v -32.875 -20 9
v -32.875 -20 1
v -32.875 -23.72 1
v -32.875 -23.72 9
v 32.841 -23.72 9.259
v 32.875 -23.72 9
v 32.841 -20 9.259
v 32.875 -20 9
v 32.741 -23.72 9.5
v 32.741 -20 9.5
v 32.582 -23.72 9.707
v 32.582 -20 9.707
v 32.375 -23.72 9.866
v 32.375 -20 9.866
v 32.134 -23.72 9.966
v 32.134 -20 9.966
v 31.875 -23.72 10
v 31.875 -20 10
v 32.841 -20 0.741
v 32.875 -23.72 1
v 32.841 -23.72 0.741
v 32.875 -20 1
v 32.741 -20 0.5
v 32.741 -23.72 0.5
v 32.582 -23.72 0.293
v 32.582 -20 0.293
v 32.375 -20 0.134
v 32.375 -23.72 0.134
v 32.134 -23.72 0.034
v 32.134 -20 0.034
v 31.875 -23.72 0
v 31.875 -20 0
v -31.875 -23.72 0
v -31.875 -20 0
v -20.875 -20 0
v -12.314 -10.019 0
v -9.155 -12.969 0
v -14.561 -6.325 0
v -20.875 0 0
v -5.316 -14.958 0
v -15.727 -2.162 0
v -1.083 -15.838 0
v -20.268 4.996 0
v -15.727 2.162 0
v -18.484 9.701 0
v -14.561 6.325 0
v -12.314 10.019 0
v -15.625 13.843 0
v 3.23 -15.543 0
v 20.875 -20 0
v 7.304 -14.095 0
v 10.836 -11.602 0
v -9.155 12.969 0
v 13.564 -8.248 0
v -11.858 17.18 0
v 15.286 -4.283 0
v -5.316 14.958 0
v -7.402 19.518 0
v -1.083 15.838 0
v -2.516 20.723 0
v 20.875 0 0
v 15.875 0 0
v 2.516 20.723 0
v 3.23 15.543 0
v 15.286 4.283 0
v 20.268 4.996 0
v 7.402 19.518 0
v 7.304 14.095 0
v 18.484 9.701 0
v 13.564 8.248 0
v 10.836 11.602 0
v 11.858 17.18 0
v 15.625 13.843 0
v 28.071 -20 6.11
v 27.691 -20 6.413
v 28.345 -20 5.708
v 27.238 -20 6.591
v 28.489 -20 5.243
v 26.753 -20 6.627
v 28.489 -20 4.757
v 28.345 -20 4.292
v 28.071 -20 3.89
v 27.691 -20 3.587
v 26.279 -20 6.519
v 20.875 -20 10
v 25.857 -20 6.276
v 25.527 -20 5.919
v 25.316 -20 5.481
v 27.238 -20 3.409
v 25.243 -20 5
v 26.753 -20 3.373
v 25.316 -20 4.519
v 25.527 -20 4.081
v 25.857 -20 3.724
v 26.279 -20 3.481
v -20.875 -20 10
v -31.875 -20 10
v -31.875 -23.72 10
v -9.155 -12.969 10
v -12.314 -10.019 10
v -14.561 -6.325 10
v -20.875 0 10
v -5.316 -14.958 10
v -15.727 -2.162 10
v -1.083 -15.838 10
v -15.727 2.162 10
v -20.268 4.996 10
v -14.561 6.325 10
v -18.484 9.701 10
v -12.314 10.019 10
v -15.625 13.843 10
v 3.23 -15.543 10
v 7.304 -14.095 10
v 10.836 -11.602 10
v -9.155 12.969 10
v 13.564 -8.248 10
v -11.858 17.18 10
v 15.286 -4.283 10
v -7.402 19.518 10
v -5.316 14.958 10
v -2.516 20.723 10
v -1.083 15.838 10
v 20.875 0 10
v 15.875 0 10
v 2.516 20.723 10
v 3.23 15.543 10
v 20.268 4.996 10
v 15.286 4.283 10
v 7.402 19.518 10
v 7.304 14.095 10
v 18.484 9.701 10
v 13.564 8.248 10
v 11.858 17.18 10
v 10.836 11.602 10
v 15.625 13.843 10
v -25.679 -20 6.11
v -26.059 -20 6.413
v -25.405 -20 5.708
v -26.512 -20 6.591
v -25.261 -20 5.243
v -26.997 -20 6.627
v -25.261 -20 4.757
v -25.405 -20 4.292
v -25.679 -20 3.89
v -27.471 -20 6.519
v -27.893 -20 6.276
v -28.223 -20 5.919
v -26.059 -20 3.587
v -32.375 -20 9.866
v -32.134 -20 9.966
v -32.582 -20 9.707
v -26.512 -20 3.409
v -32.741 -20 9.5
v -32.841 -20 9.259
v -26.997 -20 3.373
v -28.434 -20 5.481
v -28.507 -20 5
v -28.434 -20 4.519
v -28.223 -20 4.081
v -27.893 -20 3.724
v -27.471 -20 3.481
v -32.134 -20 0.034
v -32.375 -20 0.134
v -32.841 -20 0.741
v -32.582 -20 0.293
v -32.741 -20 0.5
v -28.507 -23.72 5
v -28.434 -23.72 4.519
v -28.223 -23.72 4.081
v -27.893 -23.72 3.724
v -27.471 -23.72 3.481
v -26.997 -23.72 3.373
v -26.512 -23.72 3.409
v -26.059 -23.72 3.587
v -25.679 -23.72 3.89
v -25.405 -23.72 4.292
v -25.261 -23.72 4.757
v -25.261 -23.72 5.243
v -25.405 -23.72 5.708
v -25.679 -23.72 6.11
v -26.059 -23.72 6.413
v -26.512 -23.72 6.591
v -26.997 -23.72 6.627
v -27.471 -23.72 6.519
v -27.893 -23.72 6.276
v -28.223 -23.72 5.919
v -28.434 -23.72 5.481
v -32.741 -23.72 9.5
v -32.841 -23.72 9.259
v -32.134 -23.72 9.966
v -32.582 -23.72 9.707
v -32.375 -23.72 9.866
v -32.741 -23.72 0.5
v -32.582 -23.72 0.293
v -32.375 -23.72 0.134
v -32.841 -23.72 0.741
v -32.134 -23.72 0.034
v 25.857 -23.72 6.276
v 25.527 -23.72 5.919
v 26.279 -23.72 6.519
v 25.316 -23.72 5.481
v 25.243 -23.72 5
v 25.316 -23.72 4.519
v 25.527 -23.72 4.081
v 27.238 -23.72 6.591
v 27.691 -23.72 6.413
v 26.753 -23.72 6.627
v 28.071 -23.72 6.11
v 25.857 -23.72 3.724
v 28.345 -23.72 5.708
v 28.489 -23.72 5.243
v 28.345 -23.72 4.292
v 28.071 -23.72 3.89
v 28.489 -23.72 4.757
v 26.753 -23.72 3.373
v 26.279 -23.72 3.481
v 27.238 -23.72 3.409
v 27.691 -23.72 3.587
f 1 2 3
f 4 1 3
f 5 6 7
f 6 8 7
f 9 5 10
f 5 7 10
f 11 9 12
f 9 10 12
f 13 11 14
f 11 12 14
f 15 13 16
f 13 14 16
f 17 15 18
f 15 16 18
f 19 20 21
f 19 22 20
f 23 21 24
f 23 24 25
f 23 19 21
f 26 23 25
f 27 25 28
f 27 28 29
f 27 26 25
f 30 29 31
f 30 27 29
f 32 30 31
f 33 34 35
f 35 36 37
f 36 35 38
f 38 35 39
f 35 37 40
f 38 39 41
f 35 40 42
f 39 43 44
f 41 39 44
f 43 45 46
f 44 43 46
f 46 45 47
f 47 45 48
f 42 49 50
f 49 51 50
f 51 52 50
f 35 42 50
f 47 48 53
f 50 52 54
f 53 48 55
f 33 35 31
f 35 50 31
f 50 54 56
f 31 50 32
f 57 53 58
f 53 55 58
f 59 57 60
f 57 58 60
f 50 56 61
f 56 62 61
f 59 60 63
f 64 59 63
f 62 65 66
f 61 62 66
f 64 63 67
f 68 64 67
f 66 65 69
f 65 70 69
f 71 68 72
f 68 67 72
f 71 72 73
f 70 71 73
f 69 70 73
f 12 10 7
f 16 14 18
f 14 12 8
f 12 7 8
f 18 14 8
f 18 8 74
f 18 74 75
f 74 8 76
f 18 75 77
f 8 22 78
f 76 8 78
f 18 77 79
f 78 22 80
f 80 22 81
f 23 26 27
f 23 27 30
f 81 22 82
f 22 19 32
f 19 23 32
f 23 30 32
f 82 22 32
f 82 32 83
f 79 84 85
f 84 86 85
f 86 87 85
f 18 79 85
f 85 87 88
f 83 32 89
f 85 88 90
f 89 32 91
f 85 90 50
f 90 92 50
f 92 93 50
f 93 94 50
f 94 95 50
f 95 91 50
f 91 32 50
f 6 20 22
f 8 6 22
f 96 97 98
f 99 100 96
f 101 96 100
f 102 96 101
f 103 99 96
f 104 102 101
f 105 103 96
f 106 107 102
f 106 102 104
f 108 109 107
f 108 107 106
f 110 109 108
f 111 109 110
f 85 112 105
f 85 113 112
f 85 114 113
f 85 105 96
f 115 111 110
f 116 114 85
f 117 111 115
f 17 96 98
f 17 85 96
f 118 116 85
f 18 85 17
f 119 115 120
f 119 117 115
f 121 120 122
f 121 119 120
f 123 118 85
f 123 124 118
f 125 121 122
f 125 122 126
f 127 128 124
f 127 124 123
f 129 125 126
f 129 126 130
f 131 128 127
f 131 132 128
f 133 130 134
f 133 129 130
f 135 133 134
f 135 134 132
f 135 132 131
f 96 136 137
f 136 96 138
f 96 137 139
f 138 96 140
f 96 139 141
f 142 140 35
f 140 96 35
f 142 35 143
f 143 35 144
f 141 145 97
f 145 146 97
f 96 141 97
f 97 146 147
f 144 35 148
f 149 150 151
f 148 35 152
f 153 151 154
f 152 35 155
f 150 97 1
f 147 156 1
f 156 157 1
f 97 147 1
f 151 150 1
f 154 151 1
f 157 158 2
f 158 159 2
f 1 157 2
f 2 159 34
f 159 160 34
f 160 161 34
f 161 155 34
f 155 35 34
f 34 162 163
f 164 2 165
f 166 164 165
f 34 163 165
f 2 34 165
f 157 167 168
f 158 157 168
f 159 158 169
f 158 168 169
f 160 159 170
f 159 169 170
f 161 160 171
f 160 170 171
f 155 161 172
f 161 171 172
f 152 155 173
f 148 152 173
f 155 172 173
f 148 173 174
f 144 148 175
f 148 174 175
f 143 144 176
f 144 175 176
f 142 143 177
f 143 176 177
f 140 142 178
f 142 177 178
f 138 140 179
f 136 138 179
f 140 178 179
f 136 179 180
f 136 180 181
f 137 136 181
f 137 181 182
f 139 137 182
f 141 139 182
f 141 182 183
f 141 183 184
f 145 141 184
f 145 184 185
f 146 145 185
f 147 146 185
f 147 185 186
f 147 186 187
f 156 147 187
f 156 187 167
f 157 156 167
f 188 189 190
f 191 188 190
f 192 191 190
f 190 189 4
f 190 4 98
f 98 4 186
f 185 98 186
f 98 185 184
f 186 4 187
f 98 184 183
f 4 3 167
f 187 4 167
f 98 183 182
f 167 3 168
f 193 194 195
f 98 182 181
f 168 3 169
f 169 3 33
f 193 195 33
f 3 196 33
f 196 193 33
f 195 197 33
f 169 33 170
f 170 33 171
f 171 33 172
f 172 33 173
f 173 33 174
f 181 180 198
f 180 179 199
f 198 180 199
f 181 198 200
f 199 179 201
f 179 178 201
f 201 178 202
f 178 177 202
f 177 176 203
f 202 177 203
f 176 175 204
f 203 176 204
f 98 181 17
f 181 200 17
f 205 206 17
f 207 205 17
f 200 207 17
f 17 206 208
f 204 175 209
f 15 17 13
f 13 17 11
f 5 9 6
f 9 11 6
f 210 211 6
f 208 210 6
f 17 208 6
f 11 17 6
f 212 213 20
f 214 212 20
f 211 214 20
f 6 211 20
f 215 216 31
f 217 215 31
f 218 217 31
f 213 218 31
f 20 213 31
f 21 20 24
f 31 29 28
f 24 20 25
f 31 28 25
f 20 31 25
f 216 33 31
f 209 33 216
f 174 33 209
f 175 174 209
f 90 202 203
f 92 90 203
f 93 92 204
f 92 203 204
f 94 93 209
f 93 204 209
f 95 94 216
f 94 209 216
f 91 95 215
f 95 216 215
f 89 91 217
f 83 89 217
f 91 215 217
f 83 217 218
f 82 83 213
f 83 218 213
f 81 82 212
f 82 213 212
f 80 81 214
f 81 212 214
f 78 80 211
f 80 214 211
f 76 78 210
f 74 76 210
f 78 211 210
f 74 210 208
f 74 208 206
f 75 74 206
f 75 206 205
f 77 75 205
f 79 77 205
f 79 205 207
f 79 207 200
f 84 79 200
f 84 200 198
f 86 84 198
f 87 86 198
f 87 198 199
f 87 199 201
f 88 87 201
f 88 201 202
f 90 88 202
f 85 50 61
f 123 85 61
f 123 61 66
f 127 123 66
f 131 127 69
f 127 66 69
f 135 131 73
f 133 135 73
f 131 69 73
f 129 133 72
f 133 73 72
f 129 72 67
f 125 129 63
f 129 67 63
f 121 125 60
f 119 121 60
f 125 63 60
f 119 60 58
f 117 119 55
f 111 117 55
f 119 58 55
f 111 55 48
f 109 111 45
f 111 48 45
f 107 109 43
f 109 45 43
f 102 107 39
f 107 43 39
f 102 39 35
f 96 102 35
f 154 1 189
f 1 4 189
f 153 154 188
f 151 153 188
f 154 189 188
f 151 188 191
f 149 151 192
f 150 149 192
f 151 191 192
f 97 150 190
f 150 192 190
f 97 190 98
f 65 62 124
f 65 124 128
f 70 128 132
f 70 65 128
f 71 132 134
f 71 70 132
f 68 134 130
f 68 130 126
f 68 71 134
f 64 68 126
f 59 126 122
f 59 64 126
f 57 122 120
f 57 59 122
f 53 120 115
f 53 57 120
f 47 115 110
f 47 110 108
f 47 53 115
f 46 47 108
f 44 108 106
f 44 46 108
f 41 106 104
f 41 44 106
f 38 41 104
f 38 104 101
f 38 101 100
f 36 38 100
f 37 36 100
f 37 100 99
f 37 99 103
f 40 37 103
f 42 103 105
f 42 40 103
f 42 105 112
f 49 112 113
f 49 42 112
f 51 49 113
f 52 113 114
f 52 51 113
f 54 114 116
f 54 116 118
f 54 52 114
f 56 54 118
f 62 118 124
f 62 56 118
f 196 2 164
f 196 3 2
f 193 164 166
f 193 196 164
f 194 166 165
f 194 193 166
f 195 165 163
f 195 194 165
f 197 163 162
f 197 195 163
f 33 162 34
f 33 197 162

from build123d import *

# Parameters (mm, degrees)
SKETCH1_R             = 15.875
BOSS_EXTRUDE1_DEPTH   = 10
FILLET1_R             = 1
F_4_CLEARANCE_HOLE1_D = 3.2639


with BuildPart() as part:
    # Sketch1 → Boss-Extrude1 (new body)
    with BuildSketch(Plane.XY):
        with BuildLine():
            Line((-20.875, 0), (-20.875, -20))
            Line((-20.875, -20), (-32.875, -20))
            Line((-32.875, -20), (-32.875, -23.72))
            Line((-32.875, -23.72), (32.875, -23.72))
            Line((32.875, -23.72), (32.875, -20))
            Line((32.875, -20), (20.875, -20))
            Line((20.875, -20), (20.875, 0))
            ThreePointArc((20.875, 0), (0, 20.875), (-20.875, 0))
        make_face()
        Circle(SKETCH1_R, mode=Mode.SUBTRACT)
    extrude(amount=BOSS_EXTRUDE1_DEPTH)

    # Fillet1
    fillet1_edges = [part.edges().sort_by_distance(p)[0] for p in [
        (-32.875, -21.86, 10),
        (32.875, -21.86, 10),
        (32.875, -21.86, 0),
        (-32.875, -21.86, 0),
    ]]
    fillet(fillet1_edges, radius=FILLET1_R)

    # #4 Clearance Hole1 (through all)
    with Locations(Plane(origin=(0, -20, 0), x_dir=(1, 0, 0), z_dir=(0, 1, 0))):
        with Locations((-26.875, -5), (26.875, -5)):
            Hole(F_4_CLEARANCE_HOLE1_D / 2)


solid = part.part
